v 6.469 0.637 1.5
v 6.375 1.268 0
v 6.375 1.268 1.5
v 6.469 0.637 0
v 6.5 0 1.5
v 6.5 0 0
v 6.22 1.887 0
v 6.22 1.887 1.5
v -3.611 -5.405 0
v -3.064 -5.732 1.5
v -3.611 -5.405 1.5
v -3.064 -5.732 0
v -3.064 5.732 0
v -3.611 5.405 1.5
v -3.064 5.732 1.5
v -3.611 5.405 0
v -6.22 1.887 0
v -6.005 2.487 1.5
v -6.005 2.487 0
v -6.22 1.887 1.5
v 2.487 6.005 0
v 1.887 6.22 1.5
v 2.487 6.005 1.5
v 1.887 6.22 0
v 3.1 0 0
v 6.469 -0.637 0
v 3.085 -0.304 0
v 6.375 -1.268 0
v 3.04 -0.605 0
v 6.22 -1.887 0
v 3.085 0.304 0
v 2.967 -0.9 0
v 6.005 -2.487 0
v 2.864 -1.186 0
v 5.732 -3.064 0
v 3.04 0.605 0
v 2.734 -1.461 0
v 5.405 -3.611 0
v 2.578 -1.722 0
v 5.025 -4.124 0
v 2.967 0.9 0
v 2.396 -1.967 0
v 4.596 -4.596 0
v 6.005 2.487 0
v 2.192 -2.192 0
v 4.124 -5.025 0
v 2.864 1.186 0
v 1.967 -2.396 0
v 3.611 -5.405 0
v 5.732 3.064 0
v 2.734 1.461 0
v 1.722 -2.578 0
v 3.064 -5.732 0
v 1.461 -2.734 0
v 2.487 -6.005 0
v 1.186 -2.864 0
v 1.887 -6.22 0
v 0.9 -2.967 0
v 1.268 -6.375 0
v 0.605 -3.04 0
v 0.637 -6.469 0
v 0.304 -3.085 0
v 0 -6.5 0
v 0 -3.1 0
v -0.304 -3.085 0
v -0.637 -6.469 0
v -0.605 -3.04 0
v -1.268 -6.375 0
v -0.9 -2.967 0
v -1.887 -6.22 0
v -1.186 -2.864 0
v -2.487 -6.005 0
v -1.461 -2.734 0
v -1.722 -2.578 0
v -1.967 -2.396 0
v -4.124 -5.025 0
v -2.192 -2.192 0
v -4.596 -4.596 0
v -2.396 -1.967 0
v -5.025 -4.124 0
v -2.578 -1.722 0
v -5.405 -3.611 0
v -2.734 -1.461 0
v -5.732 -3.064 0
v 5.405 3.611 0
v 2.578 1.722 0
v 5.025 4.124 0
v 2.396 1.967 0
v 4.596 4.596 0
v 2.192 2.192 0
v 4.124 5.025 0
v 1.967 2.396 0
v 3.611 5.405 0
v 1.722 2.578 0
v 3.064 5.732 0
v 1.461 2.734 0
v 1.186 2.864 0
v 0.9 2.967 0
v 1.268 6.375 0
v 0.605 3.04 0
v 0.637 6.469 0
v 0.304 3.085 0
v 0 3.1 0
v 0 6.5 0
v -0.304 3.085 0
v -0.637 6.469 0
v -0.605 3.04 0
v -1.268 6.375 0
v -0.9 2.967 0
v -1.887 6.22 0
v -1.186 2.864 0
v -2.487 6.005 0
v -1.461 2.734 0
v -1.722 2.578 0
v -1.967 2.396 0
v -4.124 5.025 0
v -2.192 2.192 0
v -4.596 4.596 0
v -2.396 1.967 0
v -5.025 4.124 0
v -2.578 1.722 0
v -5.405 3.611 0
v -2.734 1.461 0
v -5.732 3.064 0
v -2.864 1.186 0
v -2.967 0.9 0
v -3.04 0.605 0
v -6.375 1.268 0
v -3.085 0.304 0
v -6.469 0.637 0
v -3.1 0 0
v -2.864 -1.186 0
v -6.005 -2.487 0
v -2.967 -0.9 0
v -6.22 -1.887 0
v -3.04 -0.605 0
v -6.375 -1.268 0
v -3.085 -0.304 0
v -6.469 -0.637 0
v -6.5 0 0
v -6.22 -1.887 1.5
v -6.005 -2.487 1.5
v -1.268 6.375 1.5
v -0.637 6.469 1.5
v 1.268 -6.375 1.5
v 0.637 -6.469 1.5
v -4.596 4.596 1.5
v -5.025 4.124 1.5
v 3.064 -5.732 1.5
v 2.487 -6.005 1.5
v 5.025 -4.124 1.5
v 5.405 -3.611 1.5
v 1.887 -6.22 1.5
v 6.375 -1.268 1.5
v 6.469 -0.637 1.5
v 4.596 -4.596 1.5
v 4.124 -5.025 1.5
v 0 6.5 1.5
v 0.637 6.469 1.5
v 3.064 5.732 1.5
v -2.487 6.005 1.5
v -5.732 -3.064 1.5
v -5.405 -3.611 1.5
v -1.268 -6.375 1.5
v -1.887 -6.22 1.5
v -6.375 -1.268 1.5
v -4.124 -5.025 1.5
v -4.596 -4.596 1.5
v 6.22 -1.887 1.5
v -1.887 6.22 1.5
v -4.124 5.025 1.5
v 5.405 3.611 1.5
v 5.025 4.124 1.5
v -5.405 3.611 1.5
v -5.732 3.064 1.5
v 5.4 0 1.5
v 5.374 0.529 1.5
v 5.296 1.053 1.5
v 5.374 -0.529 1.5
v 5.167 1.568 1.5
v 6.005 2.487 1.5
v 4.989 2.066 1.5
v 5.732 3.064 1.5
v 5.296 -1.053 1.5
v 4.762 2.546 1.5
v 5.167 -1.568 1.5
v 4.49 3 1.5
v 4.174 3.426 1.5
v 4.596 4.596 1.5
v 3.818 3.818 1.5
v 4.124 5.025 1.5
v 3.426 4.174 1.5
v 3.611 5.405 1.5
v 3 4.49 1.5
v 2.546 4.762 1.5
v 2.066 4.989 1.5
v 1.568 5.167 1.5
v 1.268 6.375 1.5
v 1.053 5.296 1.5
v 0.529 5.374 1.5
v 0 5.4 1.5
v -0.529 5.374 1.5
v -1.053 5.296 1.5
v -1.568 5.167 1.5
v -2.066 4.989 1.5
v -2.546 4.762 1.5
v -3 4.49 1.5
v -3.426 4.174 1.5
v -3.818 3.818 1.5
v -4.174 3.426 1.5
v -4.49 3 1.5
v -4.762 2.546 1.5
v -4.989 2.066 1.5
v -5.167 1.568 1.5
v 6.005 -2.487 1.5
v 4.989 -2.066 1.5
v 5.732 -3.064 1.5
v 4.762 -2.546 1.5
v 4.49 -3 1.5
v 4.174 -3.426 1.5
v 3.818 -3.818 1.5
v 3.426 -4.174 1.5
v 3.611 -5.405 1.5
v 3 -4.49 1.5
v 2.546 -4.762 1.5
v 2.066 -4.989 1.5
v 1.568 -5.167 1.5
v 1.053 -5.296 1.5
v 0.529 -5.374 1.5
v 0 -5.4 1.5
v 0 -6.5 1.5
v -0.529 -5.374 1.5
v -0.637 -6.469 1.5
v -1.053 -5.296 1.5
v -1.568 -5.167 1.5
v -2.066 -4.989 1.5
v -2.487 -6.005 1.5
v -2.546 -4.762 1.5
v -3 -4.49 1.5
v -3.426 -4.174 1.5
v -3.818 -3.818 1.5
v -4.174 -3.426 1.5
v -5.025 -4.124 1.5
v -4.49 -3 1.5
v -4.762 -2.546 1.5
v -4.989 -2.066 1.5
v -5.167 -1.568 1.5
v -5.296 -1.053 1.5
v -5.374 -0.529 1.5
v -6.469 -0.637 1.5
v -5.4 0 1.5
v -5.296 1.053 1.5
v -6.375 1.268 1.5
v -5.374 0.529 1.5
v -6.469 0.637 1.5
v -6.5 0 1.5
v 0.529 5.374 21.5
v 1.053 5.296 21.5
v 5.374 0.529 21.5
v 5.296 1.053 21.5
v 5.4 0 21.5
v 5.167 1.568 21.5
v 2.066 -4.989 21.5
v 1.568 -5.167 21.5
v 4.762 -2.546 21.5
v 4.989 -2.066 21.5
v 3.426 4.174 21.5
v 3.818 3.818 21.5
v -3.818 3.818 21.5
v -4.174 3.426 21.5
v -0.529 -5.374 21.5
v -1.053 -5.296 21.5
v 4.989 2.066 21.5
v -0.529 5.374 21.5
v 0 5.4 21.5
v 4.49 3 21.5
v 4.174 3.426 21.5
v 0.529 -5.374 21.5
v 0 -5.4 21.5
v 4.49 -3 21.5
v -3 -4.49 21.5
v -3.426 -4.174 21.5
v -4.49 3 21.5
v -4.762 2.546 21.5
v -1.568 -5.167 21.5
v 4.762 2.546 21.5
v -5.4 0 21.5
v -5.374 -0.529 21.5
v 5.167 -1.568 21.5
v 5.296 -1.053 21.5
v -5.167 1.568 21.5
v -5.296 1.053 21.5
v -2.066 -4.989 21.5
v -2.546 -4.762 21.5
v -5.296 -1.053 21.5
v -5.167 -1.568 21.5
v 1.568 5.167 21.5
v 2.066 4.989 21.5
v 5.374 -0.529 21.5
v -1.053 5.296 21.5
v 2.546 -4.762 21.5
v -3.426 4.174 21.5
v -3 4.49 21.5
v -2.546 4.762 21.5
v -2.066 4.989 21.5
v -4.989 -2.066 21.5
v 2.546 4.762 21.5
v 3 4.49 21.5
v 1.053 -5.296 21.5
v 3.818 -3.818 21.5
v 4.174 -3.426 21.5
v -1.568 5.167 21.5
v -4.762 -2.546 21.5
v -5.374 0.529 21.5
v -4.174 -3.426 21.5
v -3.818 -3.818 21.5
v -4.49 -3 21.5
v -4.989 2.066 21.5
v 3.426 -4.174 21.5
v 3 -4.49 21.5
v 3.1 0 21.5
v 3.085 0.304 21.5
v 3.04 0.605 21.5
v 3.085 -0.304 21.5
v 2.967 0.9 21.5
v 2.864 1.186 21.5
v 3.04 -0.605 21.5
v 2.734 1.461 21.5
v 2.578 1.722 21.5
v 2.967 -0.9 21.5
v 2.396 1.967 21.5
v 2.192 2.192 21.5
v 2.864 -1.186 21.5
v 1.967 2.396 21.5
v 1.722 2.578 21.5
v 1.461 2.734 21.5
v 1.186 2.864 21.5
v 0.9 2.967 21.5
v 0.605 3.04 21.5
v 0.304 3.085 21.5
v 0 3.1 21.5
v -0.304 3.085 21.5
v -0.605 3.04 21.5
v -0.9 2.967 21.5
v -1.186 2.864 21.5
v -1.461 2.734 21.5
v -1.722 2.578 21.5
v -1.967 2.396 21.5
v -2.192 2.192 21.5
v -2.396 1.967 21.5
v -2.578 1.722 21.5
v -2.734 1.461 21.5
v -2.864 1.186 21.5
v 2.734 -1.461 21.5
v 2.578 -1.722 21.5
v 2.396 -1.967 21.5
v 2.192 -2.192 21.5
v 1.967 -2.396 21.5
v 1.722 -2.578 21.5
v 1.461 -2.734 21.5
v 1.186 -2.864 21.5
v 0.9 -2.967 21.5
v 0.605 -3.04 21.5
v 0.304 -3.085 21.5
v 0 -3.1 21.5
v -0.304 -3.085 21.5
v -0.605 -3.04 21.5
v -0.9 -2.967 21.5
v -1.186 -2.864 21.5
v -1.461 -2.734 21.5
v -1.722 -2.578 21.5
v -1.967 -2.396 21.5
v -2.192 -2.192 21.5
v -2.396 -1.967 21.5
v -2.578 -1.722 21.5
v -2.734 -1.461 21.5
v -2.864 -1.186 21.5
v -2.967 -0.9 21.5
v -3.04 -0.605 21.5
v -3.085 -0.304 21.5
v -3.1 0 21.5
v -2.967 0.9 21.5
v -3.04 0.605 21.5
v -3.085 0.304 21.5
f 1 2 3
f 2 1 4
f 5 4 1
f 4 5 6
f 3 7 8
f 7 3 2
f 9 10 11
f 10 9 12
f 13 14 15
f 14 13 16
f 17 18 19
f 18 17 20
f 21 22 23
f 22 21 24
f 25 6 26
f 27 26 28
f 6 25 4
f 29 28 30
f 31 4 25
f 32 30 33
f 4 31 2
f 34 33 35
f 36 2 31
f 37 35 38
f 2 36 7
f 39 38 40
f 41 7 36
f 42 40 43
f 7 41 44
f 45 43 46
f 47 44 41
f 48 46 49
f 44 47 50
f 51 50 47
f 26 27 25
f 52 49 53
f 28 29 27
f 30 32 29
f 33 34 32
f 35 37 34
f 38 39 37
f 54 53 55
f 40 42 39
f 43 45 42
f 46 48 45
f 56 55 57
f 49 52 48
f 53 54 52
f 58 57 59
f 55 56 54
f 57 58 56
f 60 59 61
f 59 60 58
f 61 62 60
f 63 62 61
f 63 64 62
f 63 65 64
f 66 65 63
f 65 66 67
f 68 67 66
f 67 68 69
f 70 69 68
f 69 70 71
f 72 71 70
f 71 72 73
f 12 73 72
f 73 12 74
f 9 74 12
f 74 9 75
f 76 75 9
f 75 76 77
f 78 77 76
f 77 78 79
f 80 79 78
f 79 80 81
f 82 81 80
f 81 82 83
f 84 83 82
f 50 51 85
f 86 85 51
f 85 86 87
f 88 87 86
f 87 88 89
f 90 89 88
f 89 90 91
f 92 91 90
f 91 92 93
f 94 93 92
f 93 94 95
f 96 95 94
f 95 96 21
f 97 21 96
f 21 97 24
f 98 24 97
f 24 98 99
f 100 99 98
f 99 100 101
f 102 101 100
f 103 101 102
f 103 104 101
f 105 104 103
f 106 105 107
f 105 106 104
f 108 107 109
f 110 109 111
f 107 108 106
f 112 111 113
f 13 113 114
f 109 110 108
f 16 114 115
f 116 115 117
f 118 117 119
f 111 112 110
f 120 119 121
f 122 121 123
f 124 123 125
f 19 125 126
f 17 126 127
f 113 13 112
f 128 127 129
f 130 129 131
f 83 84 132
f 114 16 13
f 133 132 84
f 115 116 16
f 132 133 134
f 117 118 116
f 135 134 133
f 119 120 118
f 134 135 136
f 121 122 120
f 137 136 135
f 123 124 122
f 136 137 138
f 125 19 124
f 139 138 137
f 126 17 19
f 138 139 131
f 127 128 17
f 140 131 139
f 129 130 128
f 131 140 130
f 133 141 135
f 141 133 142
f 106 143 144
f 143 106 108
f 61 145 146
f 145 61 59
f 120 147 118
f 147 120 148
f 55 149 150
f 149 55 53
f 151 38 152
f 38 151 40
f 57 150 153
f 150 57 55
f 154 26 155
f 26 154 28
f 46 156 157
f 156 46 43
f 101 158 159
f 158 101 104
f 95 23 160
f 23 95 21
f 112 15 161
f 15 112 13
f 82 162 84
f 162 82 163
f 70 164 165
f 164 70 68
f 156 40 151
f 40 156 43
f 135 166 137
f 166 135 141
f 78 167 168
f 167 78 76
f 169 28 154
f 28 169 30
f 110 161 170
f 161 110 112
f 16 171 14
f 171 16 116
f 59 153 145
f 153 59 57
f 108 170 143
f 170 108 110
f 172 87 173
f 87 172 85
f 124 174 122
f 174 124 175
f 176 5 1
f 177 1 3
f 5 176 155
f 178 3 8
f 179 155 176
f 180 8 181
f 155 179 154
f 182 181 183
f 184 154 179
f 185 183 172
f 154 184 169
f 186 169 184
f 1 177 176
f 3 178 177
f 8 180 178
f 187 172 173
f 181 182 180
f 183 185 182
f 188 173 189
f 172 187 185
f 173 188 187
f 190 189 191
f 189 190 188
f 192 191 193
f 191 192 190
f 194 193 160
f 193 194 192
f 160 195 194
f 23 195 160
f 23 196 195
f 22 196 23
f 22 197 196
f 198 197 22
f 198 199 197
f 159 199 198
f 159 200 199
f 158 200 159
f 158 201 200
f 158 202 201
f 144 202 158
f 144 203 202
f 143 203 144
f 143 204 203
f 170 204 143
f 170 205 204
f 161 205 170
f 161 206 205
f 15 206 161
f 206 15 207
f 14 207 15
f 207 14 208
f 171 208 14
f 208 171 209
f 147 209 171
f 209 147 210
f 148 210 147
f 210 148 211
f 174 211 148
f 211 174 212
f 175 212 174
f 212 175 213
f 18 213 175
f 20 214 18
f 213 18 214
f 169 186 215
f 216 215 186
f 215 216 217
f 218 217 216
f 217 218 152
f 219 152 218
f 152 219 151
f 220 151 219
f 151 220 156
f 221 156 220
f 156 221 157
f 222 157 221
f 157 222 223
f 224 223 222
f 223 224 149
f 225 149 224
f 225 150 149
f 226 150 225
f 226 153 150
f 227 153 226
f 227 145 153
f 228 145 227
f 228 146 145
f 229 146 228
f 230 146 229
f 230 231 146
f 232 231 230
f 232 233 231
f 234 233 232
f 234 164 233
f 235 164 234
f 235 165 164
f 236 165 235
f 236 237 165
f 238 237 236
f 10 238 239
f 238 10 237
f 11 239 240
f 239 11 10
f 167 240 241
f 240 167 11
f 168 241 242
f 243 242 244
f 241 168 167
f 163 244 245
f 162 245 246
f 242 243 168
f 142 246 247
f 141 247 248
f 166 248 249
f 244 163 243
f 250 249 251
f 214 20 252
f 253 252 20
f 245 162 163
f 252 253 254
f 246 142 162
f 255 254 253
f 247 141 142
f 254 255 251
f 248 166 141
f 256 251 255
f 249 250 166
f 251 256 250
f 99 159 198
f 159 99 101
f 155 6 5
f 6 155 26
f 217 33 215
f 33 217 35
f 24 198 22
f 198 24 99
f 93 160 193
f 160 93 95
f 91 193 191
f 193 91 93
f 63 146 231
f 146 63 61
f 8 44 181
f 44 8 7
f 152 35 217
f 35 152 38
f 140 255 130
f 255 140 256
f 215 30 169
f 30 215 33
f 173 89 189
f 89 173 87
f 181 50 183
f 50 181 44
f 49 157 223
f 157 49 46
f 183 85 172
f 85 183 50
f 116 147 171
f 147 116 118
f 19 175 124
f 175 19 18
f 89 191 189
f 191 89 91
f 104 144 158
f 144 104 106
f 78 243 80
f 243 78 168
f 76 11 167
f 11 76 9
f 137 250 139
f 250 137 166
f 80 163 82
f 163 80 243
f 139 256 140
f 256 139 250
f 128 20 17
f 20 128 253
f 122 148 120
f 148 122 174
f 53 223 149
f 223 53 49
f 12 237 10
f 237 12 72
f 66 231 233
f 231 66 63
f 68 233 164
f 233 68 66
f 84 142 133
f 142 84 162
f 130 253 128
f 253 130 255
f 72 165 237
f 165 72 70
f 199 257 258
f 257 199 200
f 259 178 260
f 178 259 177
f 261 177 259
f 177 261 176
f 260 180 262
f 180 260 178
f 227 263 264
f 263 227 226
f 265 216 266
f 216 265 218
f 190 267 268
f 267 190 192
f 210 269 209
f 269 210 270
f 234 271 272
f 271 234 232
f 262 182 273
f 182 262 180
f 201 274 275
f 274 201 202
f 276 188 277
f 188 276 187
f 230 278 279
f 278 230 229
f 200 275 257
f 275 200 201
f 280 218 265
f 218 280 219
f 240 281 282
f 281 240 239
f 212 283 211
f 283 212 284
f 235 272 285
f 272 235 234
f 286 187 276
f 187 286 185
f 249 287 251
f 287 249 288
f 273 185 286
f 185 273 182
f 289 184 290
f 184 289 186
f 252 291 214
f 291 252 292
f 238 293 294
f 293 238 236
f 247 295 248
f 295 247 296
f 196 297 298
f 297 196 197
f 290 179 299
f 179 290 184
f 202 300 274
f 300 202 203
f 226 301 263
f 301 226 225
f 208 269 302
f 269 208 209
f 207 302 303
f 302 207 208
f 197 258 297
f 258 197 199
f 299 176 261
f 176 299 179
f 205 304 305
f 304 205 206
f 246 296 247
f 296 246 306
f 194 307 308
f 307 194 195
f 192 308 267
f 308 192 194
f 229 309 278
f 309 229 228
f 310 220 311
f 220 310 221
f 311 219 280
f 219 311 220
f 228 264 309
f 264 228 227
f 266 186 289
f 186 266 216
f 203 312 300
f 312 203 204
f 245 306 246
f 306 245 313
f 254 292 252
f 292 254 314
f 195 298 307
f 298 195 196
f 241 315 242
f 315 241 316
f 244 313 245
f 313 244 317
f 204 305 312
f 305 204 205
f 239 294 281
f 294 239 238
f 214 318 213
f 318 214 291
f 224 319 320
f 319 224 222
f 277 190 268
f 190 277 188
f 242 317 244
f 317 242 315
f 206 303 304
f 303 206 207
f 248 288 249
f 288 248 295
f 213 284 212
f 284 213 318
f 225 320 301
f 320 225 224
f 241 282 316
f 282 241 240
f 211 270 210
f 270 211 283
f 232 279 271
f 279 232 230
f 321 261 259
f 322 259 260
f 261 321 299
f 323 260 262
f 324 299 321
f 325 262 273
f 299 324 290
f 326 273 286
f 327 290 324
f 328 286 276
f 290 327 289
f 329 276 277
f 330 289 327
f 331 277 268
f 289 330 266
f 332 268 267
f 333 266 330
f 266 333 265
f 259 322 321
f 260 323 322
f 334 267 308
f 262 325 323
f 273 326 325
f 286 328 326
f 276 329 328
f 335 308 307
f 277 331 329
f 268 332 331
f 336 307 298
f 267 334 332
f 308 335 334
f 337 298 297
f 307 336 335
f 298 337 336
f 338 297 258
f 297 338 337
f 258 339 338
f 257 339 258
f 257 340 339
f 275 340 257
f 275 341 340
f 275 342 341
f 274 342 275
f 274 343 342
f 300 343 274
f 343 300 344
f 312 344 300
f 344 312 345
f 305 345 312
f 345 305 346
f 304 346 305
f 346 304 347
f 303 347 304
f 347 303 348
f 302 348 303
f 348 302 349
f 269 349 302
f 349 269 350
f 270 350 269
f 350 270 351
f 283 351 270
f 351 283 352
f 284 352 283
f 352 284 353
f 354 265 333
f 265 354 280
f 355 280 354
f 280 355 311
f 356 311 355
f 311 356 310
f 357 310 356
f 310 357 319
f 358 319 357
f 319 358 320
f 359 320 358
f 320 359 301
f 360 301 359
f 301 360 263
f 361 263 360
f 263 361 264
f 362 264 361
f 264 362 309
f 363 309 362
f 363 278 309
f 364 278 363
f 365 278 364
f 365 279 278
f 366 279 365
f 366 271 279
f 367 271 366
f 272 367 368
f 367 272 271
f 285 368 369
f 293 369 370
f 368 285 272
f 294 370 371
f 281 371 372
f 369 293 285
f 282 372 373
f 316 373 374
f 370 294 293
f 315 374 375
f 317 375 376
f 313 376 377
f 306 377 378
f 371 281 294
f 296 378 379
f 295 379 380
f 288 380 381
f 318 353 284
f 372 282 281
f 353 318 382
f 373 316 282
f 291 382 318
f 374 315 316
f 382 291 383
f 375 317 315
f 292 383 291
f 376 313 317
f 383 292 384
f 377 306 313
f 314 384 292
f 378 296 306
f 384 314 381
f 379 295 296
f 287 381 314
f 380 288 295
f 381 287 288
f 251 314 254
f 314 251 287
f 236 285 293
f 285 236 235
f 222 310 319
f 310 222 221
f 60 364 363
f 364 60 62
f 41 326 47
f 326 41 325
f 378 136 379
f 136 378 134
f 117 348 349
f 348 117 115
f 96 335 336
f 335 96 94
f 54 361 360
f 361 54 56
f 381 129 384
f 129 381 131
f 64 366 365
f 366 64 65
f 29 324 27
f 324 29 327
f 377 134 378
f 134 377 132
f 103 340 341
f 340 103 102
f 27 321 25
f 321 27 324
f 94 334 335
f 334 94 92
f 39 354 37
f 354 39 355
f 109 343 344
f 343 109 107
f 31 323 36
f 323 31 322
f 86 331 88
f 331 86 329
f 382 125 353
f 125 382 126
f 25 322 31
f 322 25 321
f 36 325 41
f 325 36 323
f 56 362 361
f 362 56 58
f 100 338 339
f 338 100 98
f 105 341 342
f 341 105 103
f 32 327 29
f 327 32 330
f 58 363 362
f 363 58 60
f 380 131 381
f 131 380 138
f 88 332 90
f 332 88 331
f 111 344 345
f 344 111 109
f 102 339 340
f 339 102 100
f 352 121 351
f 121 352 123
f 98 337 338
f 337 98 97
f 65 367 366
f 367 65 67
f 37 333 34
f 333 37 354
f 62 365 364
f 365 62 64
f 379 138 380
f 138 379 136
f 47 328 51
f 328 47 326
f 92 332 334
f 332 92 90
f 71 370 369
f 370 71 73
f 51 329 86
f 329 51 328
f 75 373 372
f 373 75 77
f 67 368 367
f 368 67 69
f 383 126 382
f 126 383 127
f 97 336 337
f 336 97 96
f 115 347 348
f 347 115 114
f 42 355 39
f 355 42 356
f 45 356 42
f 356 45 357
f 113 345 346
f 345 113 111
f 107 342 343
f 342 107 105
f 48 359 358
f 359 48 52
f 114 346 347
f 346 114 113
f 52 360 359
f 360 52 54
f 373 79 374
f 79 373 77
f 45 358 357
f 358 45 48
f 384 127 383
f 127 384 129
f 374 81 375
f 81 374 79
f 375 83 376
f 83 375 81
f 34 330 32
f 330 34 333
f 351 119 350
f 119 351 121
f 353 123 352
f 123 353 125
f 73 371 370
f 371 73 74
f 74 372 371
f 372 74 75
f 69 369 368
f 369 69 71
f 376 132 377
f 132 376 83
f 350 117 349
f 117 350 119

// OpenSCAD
// Adapter sleeve: 0.2 mL PCR tube in a 1.5 mL rack hole
// Print orientation: collar on the bed (z = 0), sleeve body builds upward

$fn = 64;

// --- Dimensions (mm) ---
collar_d      = 13;    // collar outer diameter
collar_h      = 1.5;   // collar thickness (z = 0 to 1.5)
sleeve_od     = 10.8;  // sleeve body outer diameter
sleeve_top_z  = 21.5;  // top of sleeve body (sleeve height)
bore_d        = 6.2;   // through-bore diameter
eps           = 0.5;   // cutter overshoot past faces

difference() {
    union() {
        // Collar
        cylinder(d = collar_d, h = collar_h);
        // Sleeve body (overlaps collar slightly for a clean union)
        translate([0, 0, collar_h - 0.01])
            cylinder(d = sleeve_od, h = sleeve_top_z - collar_h + 0.01);
    }
    // Full-height straight bore, open at both ends
    translate([0, 0, -eps])
        cylinder(d = bore_d, h = sleeve_top_z + 2 * eps);
}
